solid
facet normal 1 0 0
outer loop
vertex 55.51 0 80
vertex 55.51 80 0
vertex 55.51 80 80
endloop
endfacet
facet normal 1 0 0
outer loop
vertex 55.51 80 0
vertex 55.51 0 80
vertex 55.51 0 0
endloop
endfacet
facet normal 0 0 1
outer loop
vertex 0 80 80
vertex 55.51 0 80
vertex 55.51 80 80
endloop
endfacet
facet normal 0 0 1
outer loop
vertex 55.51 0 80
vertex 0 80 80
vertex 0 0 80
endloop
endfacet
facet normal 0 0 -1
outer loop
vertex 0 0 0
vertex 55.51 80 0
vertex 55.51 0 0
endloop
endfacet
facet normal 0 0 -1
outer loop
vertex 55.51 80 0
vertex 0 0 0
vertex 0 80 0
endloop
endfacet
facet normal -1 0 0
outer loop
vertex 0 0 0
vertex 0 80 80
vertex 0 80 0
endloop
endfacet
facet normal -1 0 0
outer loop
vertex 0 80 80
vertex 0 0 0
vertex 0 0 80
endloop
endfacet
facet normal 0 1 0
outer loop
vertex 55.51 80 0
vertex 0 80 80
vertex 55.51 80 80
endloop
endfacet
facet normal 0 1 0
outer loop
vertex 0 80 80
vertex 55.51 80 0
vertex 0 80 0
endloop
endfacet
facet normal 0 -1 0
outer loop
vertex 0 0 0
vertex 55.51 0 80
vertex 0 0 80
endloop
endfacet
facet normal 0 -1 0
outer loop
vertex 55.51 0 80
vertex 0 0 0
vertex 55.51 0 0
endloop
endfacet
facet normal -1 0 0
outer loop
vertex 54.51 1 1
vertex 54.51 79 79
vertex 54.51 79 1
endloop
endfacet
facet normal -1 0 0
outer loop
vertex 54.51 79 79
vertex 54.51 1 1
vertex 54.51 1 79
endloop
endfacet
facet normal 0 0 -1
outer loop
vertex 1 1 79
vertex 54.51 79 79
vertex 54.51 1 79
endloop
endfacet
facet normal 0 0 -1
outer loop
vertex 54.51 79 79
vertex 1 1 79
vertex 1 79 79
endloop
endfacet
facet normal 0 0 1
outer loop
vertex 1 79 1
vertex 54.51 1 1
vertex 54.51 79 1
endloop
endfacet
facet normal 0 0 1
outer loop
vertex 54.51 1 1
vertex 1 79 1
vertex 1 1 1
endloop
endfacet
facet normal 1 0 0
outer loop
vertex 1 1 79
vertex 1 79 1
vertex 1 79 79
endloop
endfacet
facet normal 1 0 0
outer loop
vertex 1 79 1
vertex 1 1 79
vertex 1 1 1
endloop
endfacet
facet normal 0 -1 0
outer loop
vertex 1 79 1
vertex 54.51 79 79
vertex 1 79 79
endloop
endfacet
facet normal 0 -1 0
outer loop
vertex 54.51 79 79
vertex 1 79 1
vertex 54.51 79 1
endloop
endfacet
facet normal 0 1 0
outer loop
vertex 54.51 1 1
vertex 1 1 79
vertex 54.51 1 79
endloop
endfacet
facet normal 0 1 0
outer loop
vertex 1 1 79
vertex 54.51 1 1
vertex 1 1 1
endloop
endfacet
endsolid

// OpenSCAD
// Bob dishwasher reference envelope and manufacturing configuration.
// Dimensions are millimetres.

/* [Output] */

// Automatic uses this checkbox: checked = assembly, unchecked = cutting layout.
make_3d = true; // [false:true]

output_mode = "automatic"; // [automatic, assembly, cut_layout, exploded, single_part, debug, calibration]

/* [2D layout layers] */

// "preview" shows cutting and engraving together in OpenSCAD.
layout_material = "all"; // [all, plywood_1, plywood_2, veneer]
layout_operation = "preview"; // [preview, cut, engrave]

/* [Output part selection] */

single_part_id = "BOB-DOOR-FRAME"; // [BOB-DOOR-FRAME, BOB-RIB-01, BOB-CAL-01]

/* [Scale] */

model_height = 80; // [70:1:160]

source_width = 340; // [1:1:1000]
source_height = 490; // [1:1:1000]
source_depth = 490; // [1:1:1000]

/* [Materials and cutting] */

plywood_thickness = 4; // [1:0.1:10]
veneer_thickness = 0.6; // [0.1:0.1:3]
kerf = 0.5; // [0:0.05:1]
fit_clearance = 0.15; // [0:0.05:1]

sheet_size = [300, 300];
sheet_margin = 5; // [0:1:25]
part_spacing = 3; // [0.5:0.5:10]

/* [Door and hinge] */

door_angle = 90; // [0:1:90]
door_side_gap = 0.4; // [0:0.1:2]
door_top_gap = 0.5; // [0:0.1:2]
door_bottom_gap = 1.0; // [0:0.1:2]
hinge_pin_diameter = 2; // [0.5:0.1:5]
hinge_clearance = 0.2; // [0:0.05:1]
show_hinge = true; // [false:true]
show_door_sweep = false; // [false:true]
window_mode = "open"; // [open, transparent_insert]

/* [Veneer shell and skeleton] */

shell_rib_count = 3; // [1:1:10]
shell_mode = "ribbed_veneer"; // [ribbed_veneer]
shell_corner_radius = model_height * 0.10;
shell_front_offset = plywood_thickness;
shell_rear_offset = plywood_thickness;
minimum_veneer_bend_radius = 5; // [1:0.5:20]

show_veneer = true; // [false:true]
show_rib_cage = true; // [false:true]
veneer_opacity = 0.58; // [0.1:0.05:1]

/* [Interior and details] */

rack_enabled = true; // [false:true]
rack_removable = true; // [false:true]
rack_pullout = 0; // [0:1:80]

show_engraving = true; // [false:true]
show_chamber = true; // [false:true]
chamber_skeleton_gap = 0.5; // [0:0.1:2]

/* [Hidden] */

scale_factor = model_height / source_height;
model_width = source_width * scale_factor;
model_depth = source_depth * scale_factor;

minimum_supported_height = 70;
maximum_supported_height = 160;

$fn = $preview ? 48 : 128;

// When this configuration file is opened directly, show its derived envelope.
// bob_dishwasher.scad sets $bob_config_embedded before including this file.
if (is_undef($bob_config_embedded)) {
    echo(str("Bob configured envelope [W,D,H]: ",
             [model_width, model_depth, model_height]));
    color([0.72, 0.45, 0.20, 0.35])
        difference() {
            cube([model_width, model_depth, model_height]);
            translate([1, 1, 1])
                cube([model_width-2,
                      model_depth-2,
                      model_height-2]);
        }
}
